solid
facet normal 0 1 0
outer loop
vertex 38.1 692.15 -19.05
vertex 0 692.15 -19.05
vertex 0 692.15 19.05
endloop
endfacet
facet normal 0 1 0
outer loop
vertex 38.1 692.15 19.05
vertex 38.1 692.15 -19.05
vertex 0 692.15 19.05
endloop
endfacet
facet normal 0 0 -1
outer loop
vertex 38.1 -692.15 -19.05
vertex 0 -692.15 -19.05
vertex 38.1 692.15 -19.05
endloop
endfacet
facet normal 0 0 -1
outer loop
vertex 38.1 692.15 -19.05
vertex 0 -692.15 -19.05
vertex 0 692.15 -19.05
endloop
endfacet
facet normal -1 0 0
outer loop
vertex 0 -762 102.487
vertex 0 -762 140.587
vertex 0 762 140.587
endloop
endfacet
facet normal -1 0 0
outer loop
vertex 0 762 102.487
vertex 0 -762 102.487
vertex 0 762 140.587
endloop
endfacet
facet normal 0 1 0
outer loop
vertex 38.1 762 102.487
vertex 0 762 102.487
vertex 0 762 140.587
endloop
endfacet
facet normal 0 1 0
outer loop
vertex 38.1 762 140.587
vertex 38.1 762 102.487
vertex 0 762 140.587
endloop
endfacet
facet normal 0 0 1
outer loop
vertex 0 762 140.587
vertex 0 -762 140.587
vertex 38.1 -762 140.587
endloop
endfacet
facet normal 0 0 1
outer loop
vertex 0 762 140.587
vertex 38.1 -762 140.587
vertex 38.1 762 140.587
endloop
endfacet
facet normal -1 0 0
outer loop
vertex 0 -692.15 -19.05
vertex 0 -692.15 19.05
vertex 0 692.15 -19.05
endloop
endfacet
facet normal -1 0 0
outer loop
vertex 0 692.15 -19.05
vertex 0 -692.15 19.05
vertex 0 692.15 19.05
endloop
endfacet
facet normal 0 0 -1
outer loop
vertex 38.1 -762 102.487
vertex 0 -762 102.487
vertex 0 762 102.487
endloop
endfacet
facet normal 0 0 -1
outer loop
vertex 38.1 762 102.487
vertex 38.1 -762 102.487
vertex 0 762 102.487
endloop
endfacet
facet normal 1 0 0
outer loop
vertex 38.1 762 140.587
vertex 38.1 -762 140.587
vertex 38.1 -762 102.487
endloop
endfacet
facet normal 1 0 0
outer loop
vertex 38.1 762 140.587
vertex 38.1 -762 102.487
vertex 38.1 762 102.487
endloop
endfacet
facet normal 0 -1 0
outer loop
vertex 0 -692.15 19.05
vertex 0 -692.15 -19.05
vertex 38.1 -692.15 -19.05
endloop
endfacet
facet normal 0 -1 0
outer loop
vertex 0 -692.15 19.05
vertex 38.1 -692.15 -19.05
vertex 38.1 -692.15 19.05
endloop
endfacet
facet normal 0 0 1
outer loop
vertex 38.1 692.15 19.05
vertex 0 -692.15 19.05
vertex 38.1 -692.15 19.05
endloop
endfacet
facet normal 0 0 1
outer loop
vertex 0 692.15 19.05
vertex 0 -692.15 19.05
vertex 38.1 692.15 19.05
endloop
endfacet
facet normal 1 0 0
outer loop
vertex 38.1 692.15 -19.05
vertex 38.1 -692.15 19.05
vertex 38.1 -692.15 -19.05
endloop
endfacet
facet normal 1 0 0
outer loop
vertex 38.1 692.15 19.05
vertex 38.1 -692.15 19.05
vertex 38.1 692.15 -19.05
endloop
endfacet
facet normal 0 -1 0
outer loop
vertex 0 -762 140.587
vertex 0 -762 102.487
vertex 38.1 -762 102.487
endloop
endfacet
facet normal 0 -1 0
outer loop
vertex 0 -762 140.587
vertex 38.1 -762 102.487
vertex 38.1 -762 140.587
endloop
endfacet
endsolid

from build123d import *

# Parameters (mm, degrees)
F0_W     = 1384.3
F0_H     = 38.1
F1_DEPTH = 38.1
F2_W     = 1524
F2_H     = 38.1
F3_DEPTH = 38.1


with BuildPart() as f1:
    # F0 (on Right) → F1 (new body)
    with BuildSketch(Plane.YZ):
        Rectangle(F0_W, F0_H)
    extrude(amount=F1_DEPTH)


with BuildPart() as f3:
    # F2 (on Right) → F3 (new body)
    with BuildSketch(Plane.YZ):
        with Locations((0, 121.53666)):
            Rectangle(F2_W, F2_H)
    extrude(amount=F3_DEPTH)


solid = Compound([f1.part, f3.part])
